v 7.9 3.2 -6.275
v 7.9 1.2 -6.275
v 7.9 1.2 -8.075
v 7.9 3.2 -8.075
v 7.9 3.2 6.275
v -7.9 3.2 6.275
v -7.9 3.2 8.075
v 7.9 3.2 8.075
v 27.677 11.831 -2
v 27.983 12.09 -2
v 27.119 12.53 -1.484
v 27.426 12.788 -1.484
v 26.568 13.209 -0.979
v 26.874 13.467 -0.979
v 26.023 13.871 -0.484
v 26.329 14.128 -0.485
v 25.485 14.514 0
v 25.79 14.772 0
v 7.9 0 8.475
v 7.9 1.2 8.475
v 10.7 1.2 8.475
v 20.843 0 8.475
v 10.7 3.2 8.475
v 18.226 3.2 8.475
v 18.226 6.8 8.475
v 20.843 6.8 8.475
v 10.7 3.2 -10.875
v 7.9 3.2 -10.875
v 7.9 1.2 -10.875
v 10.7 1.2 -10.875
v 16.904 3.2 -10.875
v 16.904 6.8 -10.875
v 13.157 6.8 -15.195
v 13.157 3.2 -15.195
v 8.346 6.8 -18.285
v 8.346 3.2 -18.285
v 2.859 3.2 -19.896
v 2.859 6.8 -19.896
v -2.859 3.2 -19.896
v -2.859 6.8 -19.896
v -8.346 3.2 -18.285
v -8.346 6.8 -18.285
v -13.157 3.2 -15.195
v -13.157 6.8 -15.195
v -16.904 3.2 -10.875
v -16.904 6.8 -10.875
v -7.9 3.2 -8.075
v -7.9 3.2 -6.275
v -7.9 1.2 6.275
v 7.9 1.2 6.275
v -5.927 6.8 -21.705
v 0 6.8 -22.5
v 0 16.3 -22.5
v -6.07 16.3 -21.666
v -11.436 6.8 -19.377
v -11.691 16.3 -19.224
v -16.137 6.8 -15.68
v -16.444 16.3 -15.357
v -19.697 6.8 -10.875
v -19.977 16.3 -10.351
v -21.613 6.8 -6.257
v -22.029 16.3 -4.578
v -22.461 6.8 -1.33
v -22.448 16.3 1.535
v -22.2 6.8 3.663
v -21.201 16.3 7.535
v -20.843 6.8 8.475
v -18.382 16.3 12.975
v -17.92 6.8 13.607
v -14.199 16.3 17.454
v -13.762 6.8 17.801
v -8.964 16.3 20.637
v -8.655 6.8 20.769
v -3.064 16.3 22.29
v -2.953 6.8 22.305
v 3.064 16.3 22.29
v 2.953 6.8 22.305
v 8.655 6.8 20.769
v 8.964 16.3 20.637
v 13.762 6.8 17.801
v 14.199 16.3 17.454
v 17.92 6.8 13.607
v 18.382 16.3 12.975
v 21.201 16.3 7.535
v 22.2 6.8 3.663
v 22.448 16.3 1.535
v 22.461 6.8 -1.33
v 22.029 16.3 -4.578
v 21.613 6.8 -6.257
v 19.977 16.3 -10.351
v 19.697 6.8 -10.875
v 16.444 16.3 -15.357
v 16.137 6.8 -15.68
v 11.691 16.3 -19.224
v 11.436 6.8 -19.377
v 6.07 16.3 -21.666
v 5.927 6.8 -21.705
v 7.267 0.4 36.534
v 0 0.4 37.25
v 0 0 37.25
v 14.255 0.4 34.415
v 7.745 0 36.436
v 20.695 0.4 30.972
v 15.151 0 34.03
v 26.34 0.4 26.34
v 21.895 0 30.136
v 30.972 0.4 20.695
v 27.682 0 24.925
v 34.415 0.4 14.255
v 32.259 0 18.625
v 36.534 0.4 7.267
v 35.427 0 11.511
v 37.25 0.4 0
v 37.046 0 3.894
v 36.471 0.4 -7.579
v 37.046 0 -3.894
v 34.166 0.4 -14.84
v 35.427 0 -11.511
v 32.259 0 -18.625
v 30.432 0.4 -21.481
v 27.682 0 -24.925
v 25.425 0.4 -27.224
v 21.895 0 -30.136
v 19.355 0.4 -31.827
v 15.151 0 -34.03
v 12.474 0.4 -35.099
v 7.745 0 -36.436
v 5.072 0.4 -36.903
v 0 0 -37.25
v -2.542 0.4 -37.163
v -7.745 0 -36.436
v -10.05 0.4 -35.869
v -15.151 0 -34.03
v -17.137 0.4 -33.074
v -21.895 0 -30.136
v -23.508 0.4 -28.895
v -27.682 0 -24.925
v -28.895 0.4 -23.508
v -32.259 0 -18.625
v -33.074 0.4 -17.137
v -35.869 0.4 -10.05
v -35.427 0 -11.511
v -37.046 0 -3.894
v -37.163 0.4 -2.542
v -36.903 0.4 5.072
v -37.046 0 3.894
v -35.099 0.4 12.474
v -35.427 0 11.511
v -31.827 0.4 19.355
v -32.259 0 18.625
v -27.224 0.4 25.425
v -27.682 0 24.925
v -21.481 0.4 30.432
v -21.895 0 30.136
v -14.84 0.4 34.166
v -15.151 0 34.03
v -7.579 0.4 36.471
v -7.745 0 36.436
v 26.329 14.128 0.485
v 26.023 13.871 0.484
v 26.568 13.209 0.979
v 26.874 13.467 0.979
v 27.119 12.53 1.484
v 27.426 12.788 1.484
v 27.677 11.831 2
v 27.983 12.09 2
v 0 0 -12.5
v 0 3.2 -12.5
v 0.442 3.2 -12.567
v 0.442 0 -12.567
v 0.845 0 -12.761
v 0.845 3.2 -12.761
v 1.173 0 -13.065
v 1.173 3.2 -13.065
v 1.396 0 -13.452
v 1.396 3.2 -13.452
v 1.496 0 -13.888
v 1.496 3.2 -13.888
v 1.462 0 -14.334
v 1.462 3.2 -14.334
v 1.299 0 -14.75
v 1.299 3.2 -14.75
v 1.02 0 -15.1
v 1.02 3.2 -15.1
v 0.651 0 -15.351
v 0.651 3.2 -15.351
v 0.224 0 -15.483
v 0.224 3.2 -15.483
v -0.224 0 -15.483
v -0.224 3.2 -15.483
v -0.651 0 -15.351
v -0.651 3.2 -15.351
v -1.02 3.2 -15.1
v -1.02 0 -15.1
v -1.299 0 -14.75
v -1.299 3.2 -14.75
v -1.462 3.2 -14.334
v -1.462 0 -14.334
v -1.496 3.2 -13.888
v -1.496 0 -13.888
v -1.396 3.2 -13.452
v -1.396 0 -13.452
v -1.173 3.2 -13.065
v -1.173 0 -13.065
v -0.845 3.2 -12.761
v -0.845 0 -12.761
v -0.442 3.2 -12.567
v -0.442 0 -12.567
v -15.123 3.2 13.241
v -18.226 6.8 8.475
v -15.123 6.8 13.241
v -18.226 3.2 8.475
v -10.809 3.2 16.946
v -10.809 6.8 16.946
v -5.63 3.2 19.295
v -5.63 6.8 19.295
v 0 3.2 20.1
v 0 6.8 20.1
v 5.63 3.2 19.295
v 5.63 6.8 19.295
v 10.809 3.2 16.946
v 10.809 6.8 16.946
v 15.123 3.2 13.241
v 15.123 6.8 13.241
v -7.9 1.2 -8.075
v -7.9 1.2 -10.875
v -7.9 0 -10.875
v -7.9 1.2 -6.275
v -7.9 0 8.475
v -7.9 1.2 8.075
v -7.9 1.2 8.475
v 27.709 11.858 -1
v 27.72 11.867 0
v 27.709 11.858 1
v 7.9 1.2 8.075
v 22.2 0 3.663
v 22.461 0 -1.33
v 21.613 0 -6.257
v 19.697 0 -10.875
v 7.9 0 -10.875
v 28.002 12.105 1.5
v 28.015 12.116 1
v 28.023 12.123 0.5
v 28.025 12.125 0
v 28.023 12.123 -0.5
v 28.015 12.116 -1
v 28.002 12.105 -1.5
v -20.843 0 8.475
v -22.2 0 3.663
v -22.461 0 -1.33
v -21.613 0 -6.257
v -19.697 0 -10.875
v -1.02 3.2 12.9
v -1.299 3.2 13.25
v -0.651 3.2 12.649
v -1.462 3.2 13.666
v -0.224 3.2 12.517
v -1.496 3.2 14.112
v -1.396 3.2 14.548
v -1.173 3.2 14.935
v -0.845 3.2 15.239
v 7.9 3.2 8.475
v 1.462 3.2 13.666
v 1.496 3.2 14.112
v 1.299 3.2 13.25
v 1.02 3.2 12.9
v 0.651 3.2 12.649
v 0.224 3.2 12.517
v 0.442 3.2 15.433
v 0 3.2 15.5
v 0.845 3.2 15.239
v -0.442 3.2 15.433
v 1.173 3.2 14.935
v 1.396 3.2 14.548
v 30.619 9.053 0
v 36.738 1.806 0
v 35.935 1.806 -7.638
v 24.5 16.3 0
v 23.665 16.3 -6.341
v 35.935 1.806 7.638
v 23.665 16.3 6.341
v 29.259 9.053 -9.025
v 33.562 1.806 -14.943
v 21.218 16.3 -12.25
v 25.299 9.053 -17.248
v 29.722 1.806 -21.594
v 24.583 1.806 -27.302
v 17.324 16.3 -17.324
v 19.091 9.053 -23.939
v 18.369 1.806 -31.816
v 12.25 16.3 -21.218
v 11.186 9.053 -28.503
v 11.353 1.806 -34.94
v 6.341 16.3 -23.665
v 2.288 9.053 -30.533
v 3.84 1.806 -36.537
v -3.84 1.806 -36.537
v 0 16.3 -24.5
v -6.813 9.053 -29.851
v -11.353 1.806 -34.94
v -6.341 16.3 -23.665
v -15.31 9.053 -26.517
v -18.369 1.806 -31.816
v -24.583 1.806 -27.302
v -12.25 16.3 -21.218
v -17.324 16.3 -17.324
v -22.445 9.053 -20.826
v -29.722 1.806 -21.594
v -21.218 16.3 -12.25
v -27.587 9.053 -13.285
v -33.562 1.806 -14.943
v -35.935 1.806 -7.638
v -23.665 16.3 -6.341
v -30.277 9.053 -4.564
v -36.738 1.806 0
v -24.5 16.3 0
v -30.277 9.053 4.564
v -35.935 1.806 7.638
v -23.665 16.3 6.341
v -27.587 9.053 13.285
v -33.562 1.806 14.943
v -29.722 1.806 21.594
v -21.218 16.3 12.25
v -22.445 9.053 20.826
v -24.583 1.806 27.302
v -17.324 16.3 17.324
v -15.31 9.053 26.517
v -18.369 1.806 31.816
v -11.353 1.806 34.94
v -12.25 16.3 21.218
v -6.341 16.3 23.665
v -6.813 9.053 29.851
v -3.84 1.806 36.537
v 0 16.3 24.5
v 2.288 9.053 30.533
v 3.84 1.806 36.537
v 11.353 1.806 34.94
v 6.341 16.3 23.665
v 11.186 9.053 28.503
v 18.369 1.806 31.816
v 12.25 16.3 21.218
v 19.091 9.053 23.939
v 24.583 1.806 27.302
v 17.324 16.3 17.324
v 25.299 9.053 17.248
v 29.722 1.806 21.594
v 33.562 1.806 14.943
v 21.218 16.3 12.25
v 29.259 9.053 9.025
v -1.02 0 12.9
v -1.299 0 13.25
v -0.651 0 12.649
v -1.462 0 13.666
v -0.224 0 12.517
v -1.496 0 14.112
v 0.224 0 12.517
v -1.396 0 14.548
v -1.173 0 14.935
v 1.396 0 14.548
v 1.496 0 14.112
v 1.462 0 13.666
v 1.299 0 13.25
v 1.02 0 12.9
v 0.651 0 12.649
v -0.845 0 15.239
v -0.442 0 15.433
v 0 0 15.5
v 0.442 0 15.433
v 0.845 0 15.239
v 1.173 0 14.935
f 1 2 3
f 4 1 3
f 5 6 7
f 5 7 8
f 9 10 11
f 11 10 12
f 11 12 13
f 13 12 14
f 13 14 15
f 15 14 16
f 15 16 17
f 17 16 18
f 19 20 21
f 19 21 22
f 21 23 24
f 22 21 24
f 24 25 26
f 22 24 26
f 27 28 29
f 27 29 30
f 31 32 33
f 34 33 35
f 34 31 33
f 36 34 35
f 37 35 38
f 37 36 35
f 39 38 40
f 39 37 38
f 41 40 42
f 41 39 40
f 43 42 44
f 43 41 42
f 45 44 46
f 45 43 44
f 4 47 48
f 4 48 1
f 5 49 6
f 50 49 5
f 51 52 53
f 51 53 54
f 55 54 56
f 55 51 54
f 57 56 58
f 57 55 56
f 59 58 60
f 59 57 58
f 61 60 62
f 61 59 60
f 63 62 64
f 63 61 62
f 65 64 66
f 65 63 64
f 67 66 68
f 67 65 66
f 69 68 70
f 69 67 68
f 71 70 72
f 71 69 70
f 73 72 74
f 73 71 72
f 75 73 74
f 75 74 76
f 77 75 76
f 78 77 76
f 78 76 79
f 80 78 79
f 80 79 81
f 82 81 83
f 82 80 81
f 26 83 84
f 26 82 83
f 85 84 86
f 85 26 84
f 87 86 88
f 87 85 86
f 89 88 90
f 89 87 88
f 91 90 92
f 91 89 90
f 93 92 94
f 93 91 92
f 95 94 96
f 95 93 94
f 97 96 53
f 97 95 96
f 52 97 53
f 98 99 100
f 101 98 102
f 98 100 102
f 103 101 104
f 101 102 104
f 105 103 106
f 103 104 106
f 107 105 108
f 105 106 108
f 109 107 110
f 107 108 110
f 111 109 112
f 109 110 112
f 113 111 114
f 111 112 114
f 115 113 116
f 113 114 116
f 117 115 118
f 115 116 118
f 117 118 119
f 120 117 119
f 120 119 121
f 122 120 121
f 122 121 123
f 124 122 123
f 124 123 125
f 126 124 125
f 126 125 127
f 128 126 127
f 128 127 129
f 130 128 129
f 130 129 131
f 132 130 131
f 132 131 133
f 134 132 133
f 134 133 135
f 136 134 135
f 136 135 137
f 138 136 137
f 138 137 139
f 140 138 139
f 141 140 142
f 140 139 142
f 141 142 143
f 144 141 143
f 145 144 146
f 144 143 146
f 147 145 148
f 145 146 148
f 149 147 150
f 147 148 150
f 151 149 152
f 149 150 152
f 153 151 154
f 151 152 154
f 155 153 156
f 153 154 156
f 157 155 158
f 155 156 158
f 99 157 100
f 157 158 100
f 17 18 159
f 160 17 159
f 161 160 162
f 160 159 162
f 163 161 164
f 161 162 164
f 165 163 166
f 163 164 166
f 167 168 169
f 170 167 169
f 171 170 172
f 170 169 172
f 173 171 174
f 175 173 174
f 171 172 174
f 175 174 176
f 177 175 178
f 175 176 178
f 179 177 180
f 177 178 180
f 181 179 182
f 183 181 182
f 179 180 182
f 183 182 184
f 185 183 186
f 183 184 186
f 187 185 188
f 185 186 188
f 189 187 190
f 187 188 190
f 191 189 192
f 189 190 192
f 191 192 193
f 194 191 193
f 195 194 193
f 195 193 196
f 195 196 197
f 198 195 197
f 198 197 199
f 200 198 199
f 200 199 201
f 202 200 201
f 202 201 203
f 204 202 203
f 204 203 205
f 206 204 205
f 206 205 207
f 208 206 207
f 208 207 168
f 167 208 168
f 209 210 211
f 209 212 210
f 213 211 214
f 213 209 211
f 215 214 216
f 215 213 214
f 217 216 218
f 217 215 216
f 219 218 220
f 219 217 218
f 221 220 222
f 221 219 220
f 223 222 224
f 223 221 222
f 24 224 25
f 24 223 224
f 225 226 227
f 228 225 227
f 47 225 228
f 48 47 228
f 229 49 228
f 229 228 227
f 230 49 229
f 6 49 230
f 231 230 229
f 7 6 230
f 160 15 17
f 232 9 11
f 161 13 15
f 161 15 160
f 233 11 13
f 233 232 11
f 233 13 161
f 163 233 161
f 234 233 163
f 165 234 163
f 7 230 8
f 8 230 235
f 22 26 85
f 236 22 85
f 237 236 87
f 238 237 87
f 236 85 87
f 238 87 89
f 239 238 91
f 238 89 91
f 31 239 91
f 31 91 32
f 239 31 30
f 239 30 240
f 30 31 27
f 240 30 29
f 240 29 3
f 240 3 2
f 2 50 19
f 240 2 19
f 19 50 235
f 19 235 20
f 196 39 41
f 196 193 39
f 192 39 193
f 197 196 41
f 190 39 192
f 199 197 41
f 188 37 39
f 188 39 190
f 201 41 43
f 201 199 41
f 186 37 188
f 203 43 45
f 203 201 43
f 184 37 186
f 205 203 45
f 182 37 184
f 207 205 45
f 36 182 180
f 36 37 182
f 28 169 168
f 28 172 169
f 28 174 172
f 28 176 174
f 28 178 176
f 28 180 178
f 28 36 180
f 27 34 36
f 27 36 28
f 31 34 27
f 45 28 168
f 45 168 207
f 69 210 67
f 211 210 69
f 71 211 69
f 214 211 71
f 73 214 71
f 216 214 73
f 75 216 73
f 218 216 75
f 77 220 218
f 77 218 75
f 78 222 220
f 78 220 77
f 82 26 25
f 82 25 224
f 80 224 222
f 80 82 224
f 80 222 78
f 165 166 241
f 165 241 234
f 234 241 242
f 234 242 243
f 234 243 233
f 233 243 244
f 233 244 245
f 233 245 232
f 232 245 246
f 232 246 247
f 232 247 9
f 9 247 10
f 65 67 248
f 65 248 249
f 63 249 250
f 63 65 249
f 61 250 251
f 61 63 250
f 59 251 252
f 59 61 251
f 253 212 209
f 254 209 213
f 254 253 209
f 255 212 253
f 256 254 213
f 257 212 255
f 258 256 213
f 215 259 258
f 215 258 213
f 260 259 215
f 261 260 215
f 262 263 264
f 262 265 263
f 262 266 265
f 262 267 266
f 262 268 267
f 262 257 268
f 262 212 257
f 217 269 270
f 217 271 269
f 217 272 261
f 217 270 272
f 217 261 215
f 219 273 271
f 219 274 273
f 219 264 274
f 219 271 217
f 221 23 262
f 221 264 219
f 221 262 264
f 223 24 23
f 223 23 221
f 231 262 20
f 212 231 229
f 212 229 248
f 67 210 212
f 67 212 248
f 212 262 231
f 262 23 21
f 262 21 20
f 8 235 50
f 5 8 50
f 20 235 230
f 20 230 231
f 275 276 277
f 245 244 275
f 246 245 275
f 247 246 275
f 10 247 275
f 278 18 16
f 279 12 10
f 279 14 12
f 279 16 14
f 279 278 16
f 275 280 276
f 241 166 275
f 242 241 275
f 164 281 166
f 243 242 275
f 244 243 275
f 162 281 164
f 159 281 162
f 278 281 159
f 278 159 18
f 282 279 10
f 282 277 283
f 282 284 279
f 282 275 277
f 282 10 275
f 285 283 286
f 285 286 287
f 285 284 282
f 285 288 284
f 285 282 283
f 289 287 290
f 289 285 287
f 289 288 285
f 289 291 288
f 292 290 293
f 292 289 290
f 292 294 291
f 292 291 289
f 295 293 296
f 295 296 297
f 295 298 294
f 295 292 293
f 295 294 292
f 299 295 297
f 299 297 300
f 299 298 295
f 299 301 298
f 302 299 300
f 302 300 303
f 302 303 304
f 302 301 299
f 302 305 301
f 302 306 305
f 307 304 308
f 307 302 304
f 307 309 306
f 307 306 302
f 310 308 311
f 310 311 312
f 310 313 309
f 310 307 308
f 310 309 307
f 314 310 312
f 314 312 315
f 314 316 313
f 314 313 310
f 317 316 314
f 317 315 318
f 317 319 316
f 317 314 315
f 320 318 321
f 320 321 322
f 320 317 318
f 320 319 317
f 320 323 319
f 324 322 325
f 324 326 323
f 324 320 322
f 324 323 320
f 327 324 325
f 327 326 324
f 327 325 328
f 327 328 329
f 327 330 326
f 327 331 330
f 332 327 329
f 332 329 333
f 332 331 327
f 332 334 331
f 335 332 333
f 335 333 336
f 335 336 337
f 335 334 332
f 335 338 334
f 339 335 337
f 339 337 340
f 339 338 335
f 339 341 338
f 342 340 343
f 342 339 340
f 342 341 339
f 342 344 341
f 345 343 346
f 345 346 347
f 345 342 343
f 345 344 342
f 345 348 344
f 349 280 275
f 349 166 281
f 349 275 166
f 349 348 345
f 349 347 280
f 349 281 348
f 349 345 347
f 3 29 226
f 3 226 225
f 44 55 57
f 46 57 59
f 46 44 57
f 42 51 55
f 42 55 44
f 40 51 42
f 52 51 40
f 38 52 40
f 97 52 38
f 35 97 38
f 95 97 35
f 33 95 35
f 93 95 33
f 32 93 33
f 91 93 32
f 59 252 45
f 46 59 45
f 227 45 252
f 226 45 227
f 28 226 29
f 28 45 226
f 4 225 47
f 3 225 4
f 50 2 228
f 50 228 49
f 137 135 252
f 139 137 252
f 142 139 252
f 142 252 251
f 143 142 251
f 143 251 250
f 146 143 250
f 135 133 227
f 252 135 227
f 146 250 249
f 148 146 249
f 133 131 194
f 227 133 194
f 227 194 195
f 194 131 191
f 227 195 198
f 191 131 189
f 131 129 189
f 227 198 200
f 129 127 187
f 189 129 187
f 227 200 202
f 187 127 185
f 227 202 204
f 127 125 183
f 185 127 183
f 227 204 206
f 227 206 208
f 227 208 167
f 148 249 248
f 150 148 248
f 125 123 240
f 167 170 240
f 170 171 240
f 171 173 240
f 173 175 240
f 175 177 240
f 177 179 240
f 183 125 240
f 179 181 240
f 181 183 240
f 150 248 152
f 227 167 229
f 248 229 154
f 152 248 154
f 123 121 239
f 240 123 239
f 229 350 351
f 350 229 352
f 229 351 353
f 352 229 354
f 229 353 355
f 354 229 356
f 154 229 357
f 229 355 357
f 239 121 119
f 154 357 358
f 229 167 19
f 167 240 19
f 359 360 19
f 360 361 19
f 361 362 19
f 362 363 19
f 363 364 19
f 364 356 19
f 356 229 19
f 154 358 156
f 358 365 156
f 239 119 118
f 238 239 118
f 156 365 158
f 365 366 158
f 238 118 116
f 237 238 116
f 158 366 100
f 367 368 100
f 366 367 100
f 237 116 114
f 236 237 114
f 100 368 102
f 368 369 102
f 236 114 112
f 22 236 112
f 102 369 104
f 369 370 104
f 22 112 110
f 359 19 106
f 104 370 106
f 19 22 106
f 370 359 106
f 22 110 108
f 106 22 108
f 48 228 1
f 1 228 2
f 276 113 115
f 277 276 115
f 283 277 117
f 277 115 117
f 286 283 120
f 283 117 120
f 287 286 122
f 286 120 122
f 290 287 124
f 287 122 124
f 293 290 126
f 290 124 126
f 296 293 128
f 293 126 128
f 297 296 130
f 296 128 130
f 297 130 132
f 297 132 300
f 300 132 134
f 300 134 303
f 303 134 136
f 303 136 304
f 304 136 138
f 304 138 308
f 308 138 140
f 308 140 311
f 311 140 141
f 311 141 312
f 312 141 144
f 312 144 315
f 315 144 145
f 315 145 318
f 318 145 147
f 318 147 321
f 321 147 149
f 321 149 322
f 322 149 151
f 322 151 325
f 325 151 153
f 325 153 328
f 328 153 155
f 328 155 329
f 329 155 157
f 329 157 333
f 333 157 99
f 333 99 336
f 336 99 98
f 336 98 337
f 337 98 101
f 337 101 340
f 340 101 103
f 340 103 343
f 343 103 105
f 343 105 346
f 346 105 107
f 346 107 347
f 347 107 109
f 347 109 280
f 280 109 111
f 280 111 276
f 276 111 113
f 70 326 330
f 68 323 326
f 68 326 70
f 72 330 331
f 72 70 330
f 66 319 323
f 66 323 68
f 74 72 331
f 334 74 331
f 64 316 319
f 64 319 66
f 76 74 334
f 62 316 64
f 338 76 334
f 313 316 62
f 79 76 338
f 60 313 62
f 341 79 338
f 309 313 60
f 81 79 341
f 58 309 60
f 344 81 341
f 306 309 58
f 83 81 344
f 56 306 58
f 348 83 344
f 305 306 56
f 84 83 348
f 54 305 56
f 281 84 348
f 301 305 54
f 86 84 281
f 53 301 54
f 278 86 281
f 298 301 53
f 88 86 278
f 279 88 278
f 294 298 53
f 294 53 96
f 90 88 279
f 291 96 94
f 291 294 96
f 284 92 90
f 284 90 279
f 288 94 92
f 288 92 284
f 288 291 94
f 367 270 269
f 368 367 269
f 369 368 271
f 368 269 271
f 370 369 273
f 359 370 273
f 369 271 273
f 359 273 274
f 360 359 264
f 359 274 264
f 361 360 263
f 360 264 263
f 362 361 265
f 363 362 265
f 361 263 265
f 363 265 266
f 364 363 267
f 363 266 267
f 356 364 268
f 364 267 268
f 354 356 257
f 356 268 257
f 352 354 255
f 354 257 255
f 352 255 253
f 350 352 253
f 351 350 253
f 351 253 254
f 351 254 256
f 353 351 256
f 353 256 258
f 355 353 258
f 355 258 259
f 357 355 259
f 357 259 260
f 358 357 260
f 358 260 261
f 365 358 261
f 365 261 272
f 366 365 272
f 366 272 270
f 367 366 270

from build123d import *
from build123d.topology import SkipClean

# Parameters (mm, degrees)
SKETCH1_R           = 37.25
BOSS_EXTRUDE1_DEPTH = 1.2
SKETCH2_R           = 20.1
SKETCH2_W           = 26.3
SKETCH2_H           = 19.35
SKETCH2_W_2         = 15.8
SKETCH2_H_2         = 1.8
BOSS_EXTRUDE3_DEPTH = 2
SKETCH2_5_R         = 22.5
SKETCH2_5_R_2       = 20.1
BOSS_EXTRUDE4_DEPTH = 5.6
SKETCH2_7_R         = 22.5
SKETCH2_7_R_2       = 20.1
SKETCH2_7_W         = 26.3
SKETCH2_7_H         = 19.35
SKETCH2_7_W_2       = 15.8
SKETCH2_7_H_2       = 1.8
CUT_EXTRUDE1_DEPTH  = 55.800866781
CUT_EXTRUDE2_DEPTH  = 54.52919764
SKETCH8_R           = 1.5
CUT_EXTRUDE3_DEPTH  = 55.283837374
CUT_EXTRUDE4_DEPTH  = 54.52919764
CUT_EXTRUDE5_REACH  = 74.76


with BuildPart() as part:
    # Sketch1 → Boss-Extrude1 (new body)
    with BuildSketch(Plane(origin=(0, 0, 0), x_dir=(1, 0, 0), z_dir=(0, 1, 0))):
        with Locations(Location((0, 0, 0), (0, 0, 270))):
            Circle(SKETCH1_R)
    extrude(amount=BOSS_EXTRUDE1_DEPTH)

    # Sketch2 → Boss-Extrude3 (add)
    # profile 1 of 3: a face of its own
    with BuildSketch(Plane(origin=(0, 1.2, 0), x_dir=(1, 0, 0), z_dir=(0, 1, 0))):
        with Locations(Location((0, 0, 0), (0, 0, 270))):
            Circle(SKETCH2_R)
        with Locations((-2.45, 1.2)):
            Rectangle(SKETCH2_W, SKETCH2_H, mode=Mode.SUBTRACT)
    # profile 2 of 3: a face of its own
    with BuildSketch(Plane(origin=(0, 1.2, 0), x_dir=(1, 0, 0), z_dir=(0, 1, 0))):
        with Locations((0, 7.175)):
            Rectangle(SKETCH2_W_2, SKETCH2_H_2)
    # profile 3 of 3: a face of its own
    with BuildSketch(Plane(origin=(0, 1.2, 0), x_dir=(1, 0, 0), z_dir=(0, 1, 0))):
        with Locations((0, -7.175)):
            Rectangle(SKETCH2_W_2, SKETCH2_H_2)
    extrude(amount=BOSS_EXTRUDE3_DEPTH)

    # Sketch2<5> → Boss-Extrude4 (add)
    with BuildSketch(Plane(origin=(0, 1.2, 0), x_dir=(1, 0, 0), z_dir=(0, 1, 0))):
        with Locations(Location((0, 0, 0), (0, 0, 270))):
            Circle(SKETCH2_5_R)
        with Locations(Location((0, 0, 0), (0, 0, 270))):
            Circle(SKETCH2_5_R_2, mode=Mode.SUBTRACT)
    extrude(amount=BOSS_EXTRUDE4_DEPTH)


with BuildPart() as body_2:
    # Loft1: read off the stored shape, not the designer's step
    # Loft1 outline → Loft1 (revolve)
    with BuildSketch(Plane.XY):
        Polygon((0, 16.3), (0, 1.2), (37.25, 1.2), (24.5, 16.3), align=None)
    revolve(axis=Axis((0, 0, 0), (0, 1, 0)))

    # Sketch2<7> → Cut-Extrude1 (cut, through all)
    # profile 1 of 5: a face of its own
    with BuildSketch(Plane(origin=(0, 1.2, 0), x_dir=(1, 0, 0), z_dir=(0, 1, 0))):
        with Locations(Location((0, 0, 0), (0, 0, 90))):
            Circle(SKETCH2_7_R)
        with Locations(Location((0, 0, 0), (0, 0, 270))):
            Circle(SKETCH2_7_R_2, mode=Mode.SUBTRACT)
    # profile 2 of 5: a face of its own
    with BuildSketch(Plane(origin=(0, 1.2, 0), x_dir=(1, 0, 0), z_dir=(0, 1, 0))):
        with Locations(Location((0, 0, 0), (0, 0, 270))):
            Circle(SKETCH2_7_R_2)
        with Locations((-2.45, 1.2)):
            Rectangle(SKETCH2_7_W, SKETCH2_7_H, mode=Mode.SUBTRACT)
    # profile 3 of 5: a face of its own
    with BuildSketch(Plane(origin=(0, 1.2, 0), x_dir=(1, 0, 0), z_dir=(0, 1, 0))):
        with Locations((-2.45, 1.2)):
            Rectangle(SKETCH2_7_W, SKETCH2_7_H)
        with Locations((0, 7.175)):
            Rectangle(SKETCH2_7_W_2, SKETCH2_7_H_2, mode=Mode.SUBTRACT)
        with Locations((0, -7.175)):
            Rectangle(SKETCH2_7_W_2, SKETCH2_7_H_2, mode=Mode.SUBTRACT)
    # profile 4 of 5: a face of its own
    with BuildSketch(Plane(origin=(0, 1.2, 0), x_dir=(1, 0, 0), z_dir=(0, 1, 0))):
        with Locations((0, 7.175)):
            Rectangle(SKETCH2_7_W_2, SKETCH2_7_H_2)
    # profile 5 of 5: a face of its own
    with BuildSketch(Plane(origin=(0, 1.2, 0), x_dir=(1, 0, 0), z_dir=(0, 1, 0))):
        with Locations((0, -7.175)):
            Rectangle(SKETCH2_7_W_2, SKETCH2_7_H_2)
    extrude(amount=CUT_EXTRUDE1_DEPTH, mode=Mode.SUBTRACT)


with BuildPart() as part_1:
    add(part.part)

    # Combine1: union body 2
    add(body_2.part)

    # Sketch7 → Cut-Extrude2 (cut, through all)
    with BuildSketch(Plane(origin=(0, 6.8, 0), x_dir=(1, 0, 0), z_dir=(0, 1, 0))):
        with BuildLine():
            Line((-7.9, 10.875), (-7.9, -8.475))
            Line((-7.9, -8.475), (-20.842849493, -8.475))
            ThreePointArc((-20.842849493, -8.475), (-22.460675412, 1.329684188), (-19.69731898, 10.875))
            Line((-19.69731898, 10.875), (-7.9, 10.875))
        make_face()
    extrude(amount=-CUT_EXTRUDE2_DEPTH, mode=Mode.SUBTRACT)

    # Sketch8 → Cut-Extrude3 (cut, through all)
    with BuildSketch(Plane(origin=(0, 3.2, 0), x_dir=(1, 0, 0), z_dir=(0, 1, 0))):
        with Locations(Location((0, 14, 0), (0, 0, 270))):
            Circle(SKETCH8_R)
        with Locations(Location((0, -14, 0), (0, 0, 270))):
            Circle(SKETCH8_R)
    extrude(amount=-CUT_EXTRUDE3_DEPTH, mode=Mode.SUBTRACT)

    # Sketch9 → Cut-Extrude4 (cut, through all)
    with SkipClean():  # the faces are left unmerged after this step: merging them gives an invalid solid
        with BuildSketch(Plane(origin=(0, 6.8, 0), x_dir=(1, 0, 0), z_dir=(0, 1, 0))):
            with BuildLine():
                Line((7.9, 10.875), (7.9, -8.475))
                Line((7.9, -8.475), (20.842849493, -8.475))
                ThreePointArc((20.842849493, -8.475), (22.460675412, 1.329684188), (19.69731898, 10.875))
                Line((19.69731898, 10.875), (7.9, 10.875))
            make_face()
        extrude(amount=-CUT_EXTRUDE4_DEPTH, mode=Mode.SUBTRACT)

    # Chamfer1: read off the stored shape, not the designer's step
    # Chamfer1 outline → Chamfer1 (revolve, cut)
    with SkipClean():  # the faces are left unmerged after this step: merging them gives an invalid solid
        with BuildSketch(Plane.XY):
            Polygon((37.25, 1.806111173), (36.738217387, 1.806111173), (37.25, 0.4), align=None)
        revolve(axis=Axis((0, 0, 0), (0, 1, 0)), mode=Mode.SUBTRACT)

    # Cut-Extrude5: up to this cone (the profile starts outside it)
    with SkipClean():  # the faces are left unmerged after this step: merging them gives an invalid solid
        cut_extrude5_end = Plane(origin=(0, 13.007369, 0), z_dir=(0, -1, 0)).offset(-31.6883035) * Cone(1e-06, 112.896593677, 133.704984453, align=(Align.CENTER, Align.CENTER, Align.MIN), mode=Mode.PRIVATE)
        # Sketch10 → Cut-Extrude5 (cut, up to the surface)
        with BuildSketch(Plane(origin=(22.337472556, 18.861110933, 0), x_dir=(0, 0, -1), z_dir=(0.7640576290946525, 0.6451479980766108, 0)), mode=Mode.PRIVATE) as cut_extrude5_sk1:
            Polygon((0, -5.351986599), (-2, -8.816088214), (2, -8.816088214), align=None)
        cut_extrude5_tool1 = extrude(cut_extrude5_sk1.sketch, amount=-CUT_EXTRUDE5_REACH, mode=Mode.PRIVATE) - cut_extrude5_end
        add(cut_extrude5_tool1.solids().sort_by_distance((27.280201, 13.007369, 0))[0], mode=Mode.SUBTRACT)


solid = part_1.part
